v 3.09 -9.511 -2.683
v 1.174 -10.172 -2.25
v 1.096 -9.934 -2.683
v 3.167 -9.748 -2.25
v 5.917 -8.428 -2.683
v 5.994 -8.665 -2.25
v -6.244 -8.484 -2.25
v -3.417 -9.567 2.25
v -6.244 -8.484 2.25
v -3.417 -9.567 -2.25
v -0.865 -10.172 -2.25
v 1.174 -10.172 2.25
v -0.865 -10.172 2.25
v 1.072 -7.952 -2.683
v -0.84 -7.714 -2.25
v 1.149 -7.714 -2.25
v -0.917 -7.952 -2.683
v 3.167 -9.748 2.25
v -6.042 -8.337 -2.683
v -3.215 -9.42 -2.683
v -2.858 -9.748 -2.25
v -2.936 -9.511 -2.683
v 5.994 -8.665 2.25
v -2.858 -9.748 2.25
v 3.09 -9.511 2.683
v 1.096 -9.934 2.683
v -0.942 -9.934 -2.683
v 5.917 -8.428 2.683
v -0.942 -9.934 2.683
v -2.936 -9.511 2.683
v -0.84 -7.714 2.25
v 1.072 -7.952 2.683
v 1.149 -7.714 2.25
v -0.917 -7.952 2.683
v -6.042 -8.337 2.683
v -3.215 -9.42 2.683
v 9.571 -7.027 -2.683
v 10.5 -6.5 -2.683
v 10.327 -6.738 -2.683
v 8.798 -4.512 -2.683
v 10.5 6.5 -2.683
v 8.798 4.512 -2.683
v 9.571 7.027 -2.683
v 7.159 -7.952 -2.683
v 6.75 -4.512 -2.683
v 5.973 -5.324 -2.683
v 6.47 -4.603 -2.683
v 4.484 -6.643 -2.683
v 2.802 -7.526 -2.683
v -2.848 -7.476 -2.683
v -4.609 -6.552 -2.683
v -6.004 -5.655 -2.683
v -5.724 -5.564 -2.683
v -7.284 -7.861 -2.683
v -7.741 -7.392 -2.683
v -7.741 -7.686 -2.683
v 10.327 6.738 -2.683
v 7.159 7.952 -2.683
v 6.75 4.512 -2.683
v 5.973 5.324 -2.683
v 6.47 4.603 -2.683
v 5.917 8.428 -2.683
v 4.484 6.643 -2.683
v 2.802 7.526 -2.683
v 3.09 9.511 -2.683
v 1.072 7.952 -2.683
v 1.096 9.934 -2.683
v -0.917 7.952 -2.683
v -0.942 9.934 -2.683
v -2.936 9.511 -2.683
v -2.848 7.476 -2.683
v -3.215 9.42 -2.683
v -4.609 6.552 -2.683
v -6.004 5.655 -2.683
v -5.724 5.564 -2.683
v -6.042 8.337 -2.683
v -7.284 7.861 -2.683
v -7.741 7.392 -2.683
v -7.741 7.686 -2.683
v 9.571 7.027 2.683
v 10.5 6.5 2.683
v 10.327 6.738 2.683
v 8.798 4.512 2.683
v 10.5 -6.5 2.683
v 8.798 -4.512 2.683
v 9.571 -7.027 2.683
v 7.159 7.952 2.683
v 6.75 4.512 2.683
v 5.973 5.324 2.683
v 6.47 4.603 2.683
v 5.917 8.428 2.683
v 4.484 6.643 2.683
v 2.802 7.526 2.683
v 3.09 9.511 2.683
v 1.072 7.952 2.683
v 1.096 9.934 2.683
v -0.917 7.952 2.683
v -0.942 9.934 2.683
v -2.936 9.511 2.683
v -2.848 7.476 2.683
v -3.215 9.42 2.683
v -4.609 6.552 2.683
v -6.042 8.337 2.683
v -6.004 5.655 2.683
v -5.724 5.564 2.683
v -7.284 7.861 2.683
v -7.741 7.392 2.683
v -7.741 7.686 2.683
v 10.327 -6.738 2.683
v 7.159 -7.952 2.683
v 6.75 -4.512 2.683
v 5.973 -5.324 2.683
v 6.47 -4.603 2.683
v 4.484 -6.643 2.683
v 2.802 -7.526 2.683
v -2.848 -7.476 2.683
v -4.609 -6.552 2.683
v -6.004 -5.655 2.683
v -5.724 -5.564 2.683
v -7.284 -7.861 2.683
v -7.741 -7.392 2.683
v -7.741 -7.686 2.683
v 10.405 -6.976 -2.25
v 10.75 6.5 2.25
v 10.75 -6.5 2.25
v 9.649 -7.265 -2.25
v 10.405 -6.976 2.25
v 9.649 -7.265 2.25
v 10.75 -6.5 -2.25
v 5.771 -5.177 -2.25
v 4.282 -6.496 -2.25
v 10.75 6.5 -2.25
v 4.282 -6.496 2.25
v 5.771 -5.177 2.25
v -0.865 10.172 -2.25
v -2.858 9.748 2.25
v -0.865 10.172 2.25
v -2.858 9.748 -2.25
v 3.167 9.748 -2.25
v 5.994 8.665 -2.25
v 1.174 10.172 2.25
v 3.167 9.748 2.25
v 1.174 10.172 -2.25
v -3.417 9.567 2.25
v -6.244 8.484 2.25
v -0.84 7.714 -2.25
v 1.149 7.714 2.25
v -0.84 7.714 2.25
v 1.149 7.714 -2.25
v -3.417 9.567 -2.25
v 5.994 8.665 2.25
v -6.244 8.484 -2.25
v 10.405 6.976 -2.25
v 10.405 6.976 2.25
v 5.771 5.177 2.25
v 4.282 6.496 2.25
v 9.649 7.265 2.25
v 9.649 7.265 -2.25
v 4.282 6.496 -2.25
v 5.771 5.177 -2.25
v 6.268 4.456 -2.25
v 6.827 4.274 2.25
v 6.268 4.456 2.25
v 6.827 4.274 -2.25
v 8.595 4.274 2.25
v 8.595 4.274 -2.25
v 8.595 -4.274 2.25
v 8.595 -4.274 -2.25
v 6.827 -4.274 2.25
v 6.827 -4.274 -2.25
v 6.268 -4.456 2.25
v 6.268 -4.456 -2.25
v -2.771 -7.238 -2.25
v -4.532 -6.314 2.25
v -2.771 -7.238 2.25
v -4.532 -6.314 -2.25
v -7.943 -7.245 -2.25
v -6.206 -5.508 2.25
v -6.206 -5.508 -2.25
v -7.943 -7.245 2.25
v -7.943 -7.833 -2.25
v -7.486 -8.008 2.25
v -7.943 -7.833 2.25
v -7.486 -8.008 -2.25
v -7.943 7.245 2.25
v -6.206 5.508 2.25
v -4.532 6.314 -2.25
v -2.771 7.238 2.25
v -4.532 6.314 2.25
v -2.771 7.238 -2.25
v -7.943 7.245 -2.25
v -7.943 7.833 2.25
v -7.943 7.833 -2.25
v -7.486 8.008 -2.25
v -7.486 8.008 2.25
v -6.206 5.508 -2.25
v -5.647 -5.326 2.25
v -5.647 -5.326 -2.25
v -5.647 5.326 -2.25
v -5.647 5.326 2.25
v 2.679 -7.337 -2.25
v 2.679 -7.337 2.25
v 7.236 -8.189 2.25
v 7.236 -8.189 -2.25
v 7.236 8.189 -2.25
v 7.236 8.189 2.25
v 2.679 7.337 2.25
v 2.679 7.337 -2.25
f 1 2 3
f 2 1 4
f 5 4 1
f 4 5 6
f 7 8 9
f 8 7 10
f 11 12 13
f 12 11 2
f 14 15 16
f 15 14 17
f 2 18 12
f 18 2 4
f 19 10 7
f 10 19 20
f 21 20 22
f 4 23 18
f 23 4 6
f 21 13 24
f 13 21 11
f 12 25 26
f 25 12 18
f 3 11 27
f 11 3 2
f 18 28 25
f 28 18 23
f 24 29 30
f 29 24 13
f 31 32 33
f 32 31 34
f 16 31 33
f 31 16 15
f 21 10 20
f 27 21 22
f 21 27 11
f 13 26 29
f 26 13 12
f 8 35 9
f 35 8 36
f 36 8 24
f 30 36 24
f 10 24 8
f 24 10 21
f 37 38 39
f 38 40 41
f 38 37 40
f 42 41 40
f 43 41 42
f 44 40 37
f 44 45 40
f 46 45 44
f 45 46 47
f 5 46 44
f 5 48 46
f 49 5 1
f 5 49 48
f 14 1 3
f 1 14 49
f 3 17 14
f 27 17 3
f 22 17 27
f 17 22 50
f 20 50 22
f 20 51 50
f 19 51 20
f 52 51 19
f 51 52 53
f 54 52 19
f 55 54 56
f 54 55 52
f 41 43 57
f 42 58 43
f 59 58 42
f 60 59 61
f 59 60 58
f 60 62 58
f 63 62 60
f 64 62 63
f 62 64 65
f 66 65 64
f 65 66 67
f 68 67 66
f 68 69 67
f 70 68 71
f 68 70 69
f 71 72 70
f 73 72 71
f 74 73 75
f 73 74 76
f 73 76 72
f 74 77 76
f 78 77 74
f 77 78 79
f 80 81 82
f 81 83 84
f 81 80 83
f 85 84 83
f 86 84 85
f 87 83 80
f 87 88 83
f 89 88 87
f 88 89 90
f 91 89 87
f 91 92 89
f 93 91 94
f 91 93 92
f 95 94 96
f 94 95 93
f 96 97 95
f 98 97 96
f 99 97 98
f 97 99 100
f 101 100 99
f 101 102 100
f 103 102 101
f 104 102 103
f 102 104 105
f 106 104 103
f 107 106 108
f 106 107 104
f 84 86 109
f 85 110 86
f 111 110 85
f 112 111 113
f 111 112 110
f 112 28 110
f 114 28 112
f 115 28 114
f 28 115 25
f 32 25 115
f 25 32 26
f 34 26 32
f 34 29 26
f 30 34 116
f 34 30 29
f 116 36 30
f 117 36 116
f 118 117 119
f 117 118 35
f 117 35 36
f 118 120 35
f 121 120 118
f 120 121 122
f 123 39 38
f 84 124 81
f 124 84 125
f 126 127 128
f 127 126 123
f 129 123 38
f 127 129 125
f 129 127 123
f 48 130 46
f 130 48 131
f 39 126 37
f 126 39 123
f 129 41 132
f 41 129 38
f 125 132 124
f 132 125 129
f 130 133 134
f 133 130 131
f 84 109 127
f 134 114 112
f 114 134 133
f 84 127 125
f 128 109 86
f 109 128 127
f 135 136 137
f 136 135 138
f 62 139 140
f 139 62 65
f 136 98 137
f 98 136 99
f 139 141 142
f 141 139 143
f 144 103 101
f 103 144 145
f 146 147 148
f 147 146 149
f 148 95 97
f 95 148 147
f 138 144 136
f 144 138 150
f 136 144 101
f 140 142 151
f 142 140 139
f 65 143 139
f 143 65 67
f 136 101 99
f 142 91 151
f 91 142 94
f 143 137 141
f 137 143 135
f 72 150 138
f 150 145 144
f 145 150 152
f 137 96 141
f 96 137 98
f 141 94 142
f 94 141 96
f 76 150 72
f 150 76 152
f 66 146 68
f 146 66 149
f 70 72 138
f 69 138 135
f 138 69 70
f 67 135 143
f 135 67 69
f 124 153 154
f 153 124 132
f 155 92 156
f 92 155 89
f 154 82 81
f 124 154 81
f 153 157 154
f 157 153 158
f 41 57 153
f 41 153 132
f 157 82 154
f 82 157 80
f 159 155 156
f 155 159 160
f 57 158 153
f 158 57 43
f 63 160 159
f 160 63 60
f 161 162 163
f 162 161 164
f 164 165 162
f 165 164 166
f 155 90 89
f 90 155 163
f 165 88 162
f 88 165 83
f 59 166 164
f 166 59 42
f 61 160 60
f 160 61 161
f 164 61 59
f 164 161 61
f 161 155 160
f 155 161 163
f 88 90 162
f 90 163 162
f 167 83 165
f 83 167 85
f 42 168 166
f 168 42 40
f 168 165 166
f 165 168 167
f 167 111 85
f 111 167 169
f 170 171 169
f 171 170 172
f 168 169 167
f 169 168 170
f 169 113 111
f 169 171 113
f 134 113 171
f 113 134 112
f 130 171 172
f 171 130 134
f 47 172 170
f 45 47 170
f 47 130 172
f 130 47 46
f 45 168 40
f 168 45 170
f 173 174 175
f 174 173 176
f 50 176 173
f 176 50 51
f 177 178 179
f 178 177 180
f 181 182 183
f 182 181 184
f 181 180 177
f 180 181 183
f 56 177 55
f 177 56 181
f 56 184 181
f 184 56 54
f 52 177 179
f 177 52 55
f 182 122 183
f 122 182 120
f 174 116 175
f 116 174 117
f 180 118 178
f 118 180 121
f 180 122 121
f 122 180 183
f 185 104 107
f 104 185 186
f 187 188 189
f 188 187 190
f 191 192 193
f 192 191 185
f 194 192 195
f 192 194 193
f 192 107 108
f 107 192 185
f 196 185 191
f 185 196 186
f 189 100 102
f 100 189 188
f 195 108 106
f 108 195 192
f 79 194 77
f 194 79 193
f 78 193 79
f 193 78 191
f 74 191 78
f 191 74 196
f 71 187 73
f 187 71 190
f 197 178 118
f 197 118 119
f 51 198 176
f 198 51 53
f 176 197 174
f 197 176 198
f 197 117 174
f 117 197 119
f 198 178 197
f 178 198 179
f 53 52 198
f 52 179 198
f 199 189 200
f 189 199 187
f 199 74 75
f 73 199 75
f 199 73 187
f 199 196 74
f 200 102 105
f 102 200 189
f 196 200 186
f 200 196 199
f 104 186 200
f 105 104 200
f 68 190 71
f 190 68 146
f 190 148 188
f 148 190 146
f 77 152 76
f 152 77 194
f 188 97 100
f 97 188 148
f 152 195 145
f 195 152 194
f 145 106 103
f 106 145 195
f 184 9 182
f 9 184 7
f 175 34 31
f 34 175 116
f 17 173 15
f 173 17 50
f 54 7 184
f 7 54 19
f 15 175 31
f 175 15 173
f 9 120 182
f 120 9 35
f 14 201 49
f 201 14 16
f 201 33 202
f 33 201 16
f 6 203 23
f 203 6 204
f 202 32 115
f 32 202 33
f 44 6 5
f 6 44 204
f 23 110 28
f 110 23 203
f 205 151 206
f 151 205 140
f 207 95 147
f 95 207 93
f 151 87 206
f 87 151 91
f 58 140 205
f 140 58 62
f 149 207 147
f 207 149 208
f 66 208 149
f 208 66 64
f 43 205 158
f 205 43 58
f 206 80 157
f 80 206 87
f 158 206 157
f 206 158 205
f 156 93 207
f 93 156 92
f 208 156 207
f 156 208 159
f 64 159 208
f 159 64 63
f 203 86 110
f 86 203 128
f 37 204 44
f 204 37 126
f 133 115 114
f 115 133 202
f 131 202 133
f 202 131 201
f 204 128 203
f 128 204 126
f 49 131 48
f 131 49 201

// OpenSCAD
// Provided under a Creative Commons Share Alike License
// CC-BY-SA
// Created by MacLemon

// This Clip is used for mounting an LED strip to a pipe. Either place it between LEDs, or print from translucent material. I recommend using PET-G.

//$fn=30; // Usually fine for rendering previews.
//$fn=60; // Used for final rending to .stl. (Yes, this IS slow.)

pipe_diameter = 15.5; //mm Diameter of the pipe the clip shall hold on to.
outer_diameter = 20; //mm Outer diamter of the clip. (How beefy the clip is.
clip_width = 5; //mm Thickness of the clip. Shall fit in between LEDs.
strip_width = 8.5; //mm How wide the LED strip to be mounted is.
strip_height = .5; //mm Thickness, or how tall is the LED strip including an optional Epoxy cover.

rounding = .5; //mm
clip_thickness = outer_diameter - pipe_diameter; // mm

minkowski(){
    difference(){
        hull(){ // ring + LED strip holder block
            cylinder (r = outer_diameter / 2 - rounding / 2, h = clip_width - rounding, center = true); // Clip Ring
            translate ([(pipe_diameter + strip_height) / 2, 0, 0])
                cube ([ strip_height + clip_thickness - rounding, strip_width + clip_thickness, clip_width - rounding], center = true); // LED Block
            translate ([(-pipe_diameter - strip_height) / 2, 0, 0])
                cube ([ strip_height + clip_thickness - rounding, strip_width + clip_thickness, clip_width - rounding], center = true); // grip Block
        }

        // Remove LED strip cutout
        translate ([(pipe_diameter / 2 + strip_height + rounding)/2, 0, 0])
            cube ([(pipe_diameter / 2 + strip_height + (rounding*2)), strip_width + (rounding*2) , clip_width * 2], center = true);

        // Remove clip on section
        translate ([-sqrt(2 * pow(outer_diameter, 2))/2, 0, 0])
            rotate ([0, 0 ,135]) {
                cube ([outer_diameter, outer_diameter, clip_width * 2 ], center = true);
        }

        // Remove pipe
        #cylinder (r = pipe_diameter / 2 + rounding, h = clip_width * 12, center = true);
    }
    sphere (r = rounding);
}
